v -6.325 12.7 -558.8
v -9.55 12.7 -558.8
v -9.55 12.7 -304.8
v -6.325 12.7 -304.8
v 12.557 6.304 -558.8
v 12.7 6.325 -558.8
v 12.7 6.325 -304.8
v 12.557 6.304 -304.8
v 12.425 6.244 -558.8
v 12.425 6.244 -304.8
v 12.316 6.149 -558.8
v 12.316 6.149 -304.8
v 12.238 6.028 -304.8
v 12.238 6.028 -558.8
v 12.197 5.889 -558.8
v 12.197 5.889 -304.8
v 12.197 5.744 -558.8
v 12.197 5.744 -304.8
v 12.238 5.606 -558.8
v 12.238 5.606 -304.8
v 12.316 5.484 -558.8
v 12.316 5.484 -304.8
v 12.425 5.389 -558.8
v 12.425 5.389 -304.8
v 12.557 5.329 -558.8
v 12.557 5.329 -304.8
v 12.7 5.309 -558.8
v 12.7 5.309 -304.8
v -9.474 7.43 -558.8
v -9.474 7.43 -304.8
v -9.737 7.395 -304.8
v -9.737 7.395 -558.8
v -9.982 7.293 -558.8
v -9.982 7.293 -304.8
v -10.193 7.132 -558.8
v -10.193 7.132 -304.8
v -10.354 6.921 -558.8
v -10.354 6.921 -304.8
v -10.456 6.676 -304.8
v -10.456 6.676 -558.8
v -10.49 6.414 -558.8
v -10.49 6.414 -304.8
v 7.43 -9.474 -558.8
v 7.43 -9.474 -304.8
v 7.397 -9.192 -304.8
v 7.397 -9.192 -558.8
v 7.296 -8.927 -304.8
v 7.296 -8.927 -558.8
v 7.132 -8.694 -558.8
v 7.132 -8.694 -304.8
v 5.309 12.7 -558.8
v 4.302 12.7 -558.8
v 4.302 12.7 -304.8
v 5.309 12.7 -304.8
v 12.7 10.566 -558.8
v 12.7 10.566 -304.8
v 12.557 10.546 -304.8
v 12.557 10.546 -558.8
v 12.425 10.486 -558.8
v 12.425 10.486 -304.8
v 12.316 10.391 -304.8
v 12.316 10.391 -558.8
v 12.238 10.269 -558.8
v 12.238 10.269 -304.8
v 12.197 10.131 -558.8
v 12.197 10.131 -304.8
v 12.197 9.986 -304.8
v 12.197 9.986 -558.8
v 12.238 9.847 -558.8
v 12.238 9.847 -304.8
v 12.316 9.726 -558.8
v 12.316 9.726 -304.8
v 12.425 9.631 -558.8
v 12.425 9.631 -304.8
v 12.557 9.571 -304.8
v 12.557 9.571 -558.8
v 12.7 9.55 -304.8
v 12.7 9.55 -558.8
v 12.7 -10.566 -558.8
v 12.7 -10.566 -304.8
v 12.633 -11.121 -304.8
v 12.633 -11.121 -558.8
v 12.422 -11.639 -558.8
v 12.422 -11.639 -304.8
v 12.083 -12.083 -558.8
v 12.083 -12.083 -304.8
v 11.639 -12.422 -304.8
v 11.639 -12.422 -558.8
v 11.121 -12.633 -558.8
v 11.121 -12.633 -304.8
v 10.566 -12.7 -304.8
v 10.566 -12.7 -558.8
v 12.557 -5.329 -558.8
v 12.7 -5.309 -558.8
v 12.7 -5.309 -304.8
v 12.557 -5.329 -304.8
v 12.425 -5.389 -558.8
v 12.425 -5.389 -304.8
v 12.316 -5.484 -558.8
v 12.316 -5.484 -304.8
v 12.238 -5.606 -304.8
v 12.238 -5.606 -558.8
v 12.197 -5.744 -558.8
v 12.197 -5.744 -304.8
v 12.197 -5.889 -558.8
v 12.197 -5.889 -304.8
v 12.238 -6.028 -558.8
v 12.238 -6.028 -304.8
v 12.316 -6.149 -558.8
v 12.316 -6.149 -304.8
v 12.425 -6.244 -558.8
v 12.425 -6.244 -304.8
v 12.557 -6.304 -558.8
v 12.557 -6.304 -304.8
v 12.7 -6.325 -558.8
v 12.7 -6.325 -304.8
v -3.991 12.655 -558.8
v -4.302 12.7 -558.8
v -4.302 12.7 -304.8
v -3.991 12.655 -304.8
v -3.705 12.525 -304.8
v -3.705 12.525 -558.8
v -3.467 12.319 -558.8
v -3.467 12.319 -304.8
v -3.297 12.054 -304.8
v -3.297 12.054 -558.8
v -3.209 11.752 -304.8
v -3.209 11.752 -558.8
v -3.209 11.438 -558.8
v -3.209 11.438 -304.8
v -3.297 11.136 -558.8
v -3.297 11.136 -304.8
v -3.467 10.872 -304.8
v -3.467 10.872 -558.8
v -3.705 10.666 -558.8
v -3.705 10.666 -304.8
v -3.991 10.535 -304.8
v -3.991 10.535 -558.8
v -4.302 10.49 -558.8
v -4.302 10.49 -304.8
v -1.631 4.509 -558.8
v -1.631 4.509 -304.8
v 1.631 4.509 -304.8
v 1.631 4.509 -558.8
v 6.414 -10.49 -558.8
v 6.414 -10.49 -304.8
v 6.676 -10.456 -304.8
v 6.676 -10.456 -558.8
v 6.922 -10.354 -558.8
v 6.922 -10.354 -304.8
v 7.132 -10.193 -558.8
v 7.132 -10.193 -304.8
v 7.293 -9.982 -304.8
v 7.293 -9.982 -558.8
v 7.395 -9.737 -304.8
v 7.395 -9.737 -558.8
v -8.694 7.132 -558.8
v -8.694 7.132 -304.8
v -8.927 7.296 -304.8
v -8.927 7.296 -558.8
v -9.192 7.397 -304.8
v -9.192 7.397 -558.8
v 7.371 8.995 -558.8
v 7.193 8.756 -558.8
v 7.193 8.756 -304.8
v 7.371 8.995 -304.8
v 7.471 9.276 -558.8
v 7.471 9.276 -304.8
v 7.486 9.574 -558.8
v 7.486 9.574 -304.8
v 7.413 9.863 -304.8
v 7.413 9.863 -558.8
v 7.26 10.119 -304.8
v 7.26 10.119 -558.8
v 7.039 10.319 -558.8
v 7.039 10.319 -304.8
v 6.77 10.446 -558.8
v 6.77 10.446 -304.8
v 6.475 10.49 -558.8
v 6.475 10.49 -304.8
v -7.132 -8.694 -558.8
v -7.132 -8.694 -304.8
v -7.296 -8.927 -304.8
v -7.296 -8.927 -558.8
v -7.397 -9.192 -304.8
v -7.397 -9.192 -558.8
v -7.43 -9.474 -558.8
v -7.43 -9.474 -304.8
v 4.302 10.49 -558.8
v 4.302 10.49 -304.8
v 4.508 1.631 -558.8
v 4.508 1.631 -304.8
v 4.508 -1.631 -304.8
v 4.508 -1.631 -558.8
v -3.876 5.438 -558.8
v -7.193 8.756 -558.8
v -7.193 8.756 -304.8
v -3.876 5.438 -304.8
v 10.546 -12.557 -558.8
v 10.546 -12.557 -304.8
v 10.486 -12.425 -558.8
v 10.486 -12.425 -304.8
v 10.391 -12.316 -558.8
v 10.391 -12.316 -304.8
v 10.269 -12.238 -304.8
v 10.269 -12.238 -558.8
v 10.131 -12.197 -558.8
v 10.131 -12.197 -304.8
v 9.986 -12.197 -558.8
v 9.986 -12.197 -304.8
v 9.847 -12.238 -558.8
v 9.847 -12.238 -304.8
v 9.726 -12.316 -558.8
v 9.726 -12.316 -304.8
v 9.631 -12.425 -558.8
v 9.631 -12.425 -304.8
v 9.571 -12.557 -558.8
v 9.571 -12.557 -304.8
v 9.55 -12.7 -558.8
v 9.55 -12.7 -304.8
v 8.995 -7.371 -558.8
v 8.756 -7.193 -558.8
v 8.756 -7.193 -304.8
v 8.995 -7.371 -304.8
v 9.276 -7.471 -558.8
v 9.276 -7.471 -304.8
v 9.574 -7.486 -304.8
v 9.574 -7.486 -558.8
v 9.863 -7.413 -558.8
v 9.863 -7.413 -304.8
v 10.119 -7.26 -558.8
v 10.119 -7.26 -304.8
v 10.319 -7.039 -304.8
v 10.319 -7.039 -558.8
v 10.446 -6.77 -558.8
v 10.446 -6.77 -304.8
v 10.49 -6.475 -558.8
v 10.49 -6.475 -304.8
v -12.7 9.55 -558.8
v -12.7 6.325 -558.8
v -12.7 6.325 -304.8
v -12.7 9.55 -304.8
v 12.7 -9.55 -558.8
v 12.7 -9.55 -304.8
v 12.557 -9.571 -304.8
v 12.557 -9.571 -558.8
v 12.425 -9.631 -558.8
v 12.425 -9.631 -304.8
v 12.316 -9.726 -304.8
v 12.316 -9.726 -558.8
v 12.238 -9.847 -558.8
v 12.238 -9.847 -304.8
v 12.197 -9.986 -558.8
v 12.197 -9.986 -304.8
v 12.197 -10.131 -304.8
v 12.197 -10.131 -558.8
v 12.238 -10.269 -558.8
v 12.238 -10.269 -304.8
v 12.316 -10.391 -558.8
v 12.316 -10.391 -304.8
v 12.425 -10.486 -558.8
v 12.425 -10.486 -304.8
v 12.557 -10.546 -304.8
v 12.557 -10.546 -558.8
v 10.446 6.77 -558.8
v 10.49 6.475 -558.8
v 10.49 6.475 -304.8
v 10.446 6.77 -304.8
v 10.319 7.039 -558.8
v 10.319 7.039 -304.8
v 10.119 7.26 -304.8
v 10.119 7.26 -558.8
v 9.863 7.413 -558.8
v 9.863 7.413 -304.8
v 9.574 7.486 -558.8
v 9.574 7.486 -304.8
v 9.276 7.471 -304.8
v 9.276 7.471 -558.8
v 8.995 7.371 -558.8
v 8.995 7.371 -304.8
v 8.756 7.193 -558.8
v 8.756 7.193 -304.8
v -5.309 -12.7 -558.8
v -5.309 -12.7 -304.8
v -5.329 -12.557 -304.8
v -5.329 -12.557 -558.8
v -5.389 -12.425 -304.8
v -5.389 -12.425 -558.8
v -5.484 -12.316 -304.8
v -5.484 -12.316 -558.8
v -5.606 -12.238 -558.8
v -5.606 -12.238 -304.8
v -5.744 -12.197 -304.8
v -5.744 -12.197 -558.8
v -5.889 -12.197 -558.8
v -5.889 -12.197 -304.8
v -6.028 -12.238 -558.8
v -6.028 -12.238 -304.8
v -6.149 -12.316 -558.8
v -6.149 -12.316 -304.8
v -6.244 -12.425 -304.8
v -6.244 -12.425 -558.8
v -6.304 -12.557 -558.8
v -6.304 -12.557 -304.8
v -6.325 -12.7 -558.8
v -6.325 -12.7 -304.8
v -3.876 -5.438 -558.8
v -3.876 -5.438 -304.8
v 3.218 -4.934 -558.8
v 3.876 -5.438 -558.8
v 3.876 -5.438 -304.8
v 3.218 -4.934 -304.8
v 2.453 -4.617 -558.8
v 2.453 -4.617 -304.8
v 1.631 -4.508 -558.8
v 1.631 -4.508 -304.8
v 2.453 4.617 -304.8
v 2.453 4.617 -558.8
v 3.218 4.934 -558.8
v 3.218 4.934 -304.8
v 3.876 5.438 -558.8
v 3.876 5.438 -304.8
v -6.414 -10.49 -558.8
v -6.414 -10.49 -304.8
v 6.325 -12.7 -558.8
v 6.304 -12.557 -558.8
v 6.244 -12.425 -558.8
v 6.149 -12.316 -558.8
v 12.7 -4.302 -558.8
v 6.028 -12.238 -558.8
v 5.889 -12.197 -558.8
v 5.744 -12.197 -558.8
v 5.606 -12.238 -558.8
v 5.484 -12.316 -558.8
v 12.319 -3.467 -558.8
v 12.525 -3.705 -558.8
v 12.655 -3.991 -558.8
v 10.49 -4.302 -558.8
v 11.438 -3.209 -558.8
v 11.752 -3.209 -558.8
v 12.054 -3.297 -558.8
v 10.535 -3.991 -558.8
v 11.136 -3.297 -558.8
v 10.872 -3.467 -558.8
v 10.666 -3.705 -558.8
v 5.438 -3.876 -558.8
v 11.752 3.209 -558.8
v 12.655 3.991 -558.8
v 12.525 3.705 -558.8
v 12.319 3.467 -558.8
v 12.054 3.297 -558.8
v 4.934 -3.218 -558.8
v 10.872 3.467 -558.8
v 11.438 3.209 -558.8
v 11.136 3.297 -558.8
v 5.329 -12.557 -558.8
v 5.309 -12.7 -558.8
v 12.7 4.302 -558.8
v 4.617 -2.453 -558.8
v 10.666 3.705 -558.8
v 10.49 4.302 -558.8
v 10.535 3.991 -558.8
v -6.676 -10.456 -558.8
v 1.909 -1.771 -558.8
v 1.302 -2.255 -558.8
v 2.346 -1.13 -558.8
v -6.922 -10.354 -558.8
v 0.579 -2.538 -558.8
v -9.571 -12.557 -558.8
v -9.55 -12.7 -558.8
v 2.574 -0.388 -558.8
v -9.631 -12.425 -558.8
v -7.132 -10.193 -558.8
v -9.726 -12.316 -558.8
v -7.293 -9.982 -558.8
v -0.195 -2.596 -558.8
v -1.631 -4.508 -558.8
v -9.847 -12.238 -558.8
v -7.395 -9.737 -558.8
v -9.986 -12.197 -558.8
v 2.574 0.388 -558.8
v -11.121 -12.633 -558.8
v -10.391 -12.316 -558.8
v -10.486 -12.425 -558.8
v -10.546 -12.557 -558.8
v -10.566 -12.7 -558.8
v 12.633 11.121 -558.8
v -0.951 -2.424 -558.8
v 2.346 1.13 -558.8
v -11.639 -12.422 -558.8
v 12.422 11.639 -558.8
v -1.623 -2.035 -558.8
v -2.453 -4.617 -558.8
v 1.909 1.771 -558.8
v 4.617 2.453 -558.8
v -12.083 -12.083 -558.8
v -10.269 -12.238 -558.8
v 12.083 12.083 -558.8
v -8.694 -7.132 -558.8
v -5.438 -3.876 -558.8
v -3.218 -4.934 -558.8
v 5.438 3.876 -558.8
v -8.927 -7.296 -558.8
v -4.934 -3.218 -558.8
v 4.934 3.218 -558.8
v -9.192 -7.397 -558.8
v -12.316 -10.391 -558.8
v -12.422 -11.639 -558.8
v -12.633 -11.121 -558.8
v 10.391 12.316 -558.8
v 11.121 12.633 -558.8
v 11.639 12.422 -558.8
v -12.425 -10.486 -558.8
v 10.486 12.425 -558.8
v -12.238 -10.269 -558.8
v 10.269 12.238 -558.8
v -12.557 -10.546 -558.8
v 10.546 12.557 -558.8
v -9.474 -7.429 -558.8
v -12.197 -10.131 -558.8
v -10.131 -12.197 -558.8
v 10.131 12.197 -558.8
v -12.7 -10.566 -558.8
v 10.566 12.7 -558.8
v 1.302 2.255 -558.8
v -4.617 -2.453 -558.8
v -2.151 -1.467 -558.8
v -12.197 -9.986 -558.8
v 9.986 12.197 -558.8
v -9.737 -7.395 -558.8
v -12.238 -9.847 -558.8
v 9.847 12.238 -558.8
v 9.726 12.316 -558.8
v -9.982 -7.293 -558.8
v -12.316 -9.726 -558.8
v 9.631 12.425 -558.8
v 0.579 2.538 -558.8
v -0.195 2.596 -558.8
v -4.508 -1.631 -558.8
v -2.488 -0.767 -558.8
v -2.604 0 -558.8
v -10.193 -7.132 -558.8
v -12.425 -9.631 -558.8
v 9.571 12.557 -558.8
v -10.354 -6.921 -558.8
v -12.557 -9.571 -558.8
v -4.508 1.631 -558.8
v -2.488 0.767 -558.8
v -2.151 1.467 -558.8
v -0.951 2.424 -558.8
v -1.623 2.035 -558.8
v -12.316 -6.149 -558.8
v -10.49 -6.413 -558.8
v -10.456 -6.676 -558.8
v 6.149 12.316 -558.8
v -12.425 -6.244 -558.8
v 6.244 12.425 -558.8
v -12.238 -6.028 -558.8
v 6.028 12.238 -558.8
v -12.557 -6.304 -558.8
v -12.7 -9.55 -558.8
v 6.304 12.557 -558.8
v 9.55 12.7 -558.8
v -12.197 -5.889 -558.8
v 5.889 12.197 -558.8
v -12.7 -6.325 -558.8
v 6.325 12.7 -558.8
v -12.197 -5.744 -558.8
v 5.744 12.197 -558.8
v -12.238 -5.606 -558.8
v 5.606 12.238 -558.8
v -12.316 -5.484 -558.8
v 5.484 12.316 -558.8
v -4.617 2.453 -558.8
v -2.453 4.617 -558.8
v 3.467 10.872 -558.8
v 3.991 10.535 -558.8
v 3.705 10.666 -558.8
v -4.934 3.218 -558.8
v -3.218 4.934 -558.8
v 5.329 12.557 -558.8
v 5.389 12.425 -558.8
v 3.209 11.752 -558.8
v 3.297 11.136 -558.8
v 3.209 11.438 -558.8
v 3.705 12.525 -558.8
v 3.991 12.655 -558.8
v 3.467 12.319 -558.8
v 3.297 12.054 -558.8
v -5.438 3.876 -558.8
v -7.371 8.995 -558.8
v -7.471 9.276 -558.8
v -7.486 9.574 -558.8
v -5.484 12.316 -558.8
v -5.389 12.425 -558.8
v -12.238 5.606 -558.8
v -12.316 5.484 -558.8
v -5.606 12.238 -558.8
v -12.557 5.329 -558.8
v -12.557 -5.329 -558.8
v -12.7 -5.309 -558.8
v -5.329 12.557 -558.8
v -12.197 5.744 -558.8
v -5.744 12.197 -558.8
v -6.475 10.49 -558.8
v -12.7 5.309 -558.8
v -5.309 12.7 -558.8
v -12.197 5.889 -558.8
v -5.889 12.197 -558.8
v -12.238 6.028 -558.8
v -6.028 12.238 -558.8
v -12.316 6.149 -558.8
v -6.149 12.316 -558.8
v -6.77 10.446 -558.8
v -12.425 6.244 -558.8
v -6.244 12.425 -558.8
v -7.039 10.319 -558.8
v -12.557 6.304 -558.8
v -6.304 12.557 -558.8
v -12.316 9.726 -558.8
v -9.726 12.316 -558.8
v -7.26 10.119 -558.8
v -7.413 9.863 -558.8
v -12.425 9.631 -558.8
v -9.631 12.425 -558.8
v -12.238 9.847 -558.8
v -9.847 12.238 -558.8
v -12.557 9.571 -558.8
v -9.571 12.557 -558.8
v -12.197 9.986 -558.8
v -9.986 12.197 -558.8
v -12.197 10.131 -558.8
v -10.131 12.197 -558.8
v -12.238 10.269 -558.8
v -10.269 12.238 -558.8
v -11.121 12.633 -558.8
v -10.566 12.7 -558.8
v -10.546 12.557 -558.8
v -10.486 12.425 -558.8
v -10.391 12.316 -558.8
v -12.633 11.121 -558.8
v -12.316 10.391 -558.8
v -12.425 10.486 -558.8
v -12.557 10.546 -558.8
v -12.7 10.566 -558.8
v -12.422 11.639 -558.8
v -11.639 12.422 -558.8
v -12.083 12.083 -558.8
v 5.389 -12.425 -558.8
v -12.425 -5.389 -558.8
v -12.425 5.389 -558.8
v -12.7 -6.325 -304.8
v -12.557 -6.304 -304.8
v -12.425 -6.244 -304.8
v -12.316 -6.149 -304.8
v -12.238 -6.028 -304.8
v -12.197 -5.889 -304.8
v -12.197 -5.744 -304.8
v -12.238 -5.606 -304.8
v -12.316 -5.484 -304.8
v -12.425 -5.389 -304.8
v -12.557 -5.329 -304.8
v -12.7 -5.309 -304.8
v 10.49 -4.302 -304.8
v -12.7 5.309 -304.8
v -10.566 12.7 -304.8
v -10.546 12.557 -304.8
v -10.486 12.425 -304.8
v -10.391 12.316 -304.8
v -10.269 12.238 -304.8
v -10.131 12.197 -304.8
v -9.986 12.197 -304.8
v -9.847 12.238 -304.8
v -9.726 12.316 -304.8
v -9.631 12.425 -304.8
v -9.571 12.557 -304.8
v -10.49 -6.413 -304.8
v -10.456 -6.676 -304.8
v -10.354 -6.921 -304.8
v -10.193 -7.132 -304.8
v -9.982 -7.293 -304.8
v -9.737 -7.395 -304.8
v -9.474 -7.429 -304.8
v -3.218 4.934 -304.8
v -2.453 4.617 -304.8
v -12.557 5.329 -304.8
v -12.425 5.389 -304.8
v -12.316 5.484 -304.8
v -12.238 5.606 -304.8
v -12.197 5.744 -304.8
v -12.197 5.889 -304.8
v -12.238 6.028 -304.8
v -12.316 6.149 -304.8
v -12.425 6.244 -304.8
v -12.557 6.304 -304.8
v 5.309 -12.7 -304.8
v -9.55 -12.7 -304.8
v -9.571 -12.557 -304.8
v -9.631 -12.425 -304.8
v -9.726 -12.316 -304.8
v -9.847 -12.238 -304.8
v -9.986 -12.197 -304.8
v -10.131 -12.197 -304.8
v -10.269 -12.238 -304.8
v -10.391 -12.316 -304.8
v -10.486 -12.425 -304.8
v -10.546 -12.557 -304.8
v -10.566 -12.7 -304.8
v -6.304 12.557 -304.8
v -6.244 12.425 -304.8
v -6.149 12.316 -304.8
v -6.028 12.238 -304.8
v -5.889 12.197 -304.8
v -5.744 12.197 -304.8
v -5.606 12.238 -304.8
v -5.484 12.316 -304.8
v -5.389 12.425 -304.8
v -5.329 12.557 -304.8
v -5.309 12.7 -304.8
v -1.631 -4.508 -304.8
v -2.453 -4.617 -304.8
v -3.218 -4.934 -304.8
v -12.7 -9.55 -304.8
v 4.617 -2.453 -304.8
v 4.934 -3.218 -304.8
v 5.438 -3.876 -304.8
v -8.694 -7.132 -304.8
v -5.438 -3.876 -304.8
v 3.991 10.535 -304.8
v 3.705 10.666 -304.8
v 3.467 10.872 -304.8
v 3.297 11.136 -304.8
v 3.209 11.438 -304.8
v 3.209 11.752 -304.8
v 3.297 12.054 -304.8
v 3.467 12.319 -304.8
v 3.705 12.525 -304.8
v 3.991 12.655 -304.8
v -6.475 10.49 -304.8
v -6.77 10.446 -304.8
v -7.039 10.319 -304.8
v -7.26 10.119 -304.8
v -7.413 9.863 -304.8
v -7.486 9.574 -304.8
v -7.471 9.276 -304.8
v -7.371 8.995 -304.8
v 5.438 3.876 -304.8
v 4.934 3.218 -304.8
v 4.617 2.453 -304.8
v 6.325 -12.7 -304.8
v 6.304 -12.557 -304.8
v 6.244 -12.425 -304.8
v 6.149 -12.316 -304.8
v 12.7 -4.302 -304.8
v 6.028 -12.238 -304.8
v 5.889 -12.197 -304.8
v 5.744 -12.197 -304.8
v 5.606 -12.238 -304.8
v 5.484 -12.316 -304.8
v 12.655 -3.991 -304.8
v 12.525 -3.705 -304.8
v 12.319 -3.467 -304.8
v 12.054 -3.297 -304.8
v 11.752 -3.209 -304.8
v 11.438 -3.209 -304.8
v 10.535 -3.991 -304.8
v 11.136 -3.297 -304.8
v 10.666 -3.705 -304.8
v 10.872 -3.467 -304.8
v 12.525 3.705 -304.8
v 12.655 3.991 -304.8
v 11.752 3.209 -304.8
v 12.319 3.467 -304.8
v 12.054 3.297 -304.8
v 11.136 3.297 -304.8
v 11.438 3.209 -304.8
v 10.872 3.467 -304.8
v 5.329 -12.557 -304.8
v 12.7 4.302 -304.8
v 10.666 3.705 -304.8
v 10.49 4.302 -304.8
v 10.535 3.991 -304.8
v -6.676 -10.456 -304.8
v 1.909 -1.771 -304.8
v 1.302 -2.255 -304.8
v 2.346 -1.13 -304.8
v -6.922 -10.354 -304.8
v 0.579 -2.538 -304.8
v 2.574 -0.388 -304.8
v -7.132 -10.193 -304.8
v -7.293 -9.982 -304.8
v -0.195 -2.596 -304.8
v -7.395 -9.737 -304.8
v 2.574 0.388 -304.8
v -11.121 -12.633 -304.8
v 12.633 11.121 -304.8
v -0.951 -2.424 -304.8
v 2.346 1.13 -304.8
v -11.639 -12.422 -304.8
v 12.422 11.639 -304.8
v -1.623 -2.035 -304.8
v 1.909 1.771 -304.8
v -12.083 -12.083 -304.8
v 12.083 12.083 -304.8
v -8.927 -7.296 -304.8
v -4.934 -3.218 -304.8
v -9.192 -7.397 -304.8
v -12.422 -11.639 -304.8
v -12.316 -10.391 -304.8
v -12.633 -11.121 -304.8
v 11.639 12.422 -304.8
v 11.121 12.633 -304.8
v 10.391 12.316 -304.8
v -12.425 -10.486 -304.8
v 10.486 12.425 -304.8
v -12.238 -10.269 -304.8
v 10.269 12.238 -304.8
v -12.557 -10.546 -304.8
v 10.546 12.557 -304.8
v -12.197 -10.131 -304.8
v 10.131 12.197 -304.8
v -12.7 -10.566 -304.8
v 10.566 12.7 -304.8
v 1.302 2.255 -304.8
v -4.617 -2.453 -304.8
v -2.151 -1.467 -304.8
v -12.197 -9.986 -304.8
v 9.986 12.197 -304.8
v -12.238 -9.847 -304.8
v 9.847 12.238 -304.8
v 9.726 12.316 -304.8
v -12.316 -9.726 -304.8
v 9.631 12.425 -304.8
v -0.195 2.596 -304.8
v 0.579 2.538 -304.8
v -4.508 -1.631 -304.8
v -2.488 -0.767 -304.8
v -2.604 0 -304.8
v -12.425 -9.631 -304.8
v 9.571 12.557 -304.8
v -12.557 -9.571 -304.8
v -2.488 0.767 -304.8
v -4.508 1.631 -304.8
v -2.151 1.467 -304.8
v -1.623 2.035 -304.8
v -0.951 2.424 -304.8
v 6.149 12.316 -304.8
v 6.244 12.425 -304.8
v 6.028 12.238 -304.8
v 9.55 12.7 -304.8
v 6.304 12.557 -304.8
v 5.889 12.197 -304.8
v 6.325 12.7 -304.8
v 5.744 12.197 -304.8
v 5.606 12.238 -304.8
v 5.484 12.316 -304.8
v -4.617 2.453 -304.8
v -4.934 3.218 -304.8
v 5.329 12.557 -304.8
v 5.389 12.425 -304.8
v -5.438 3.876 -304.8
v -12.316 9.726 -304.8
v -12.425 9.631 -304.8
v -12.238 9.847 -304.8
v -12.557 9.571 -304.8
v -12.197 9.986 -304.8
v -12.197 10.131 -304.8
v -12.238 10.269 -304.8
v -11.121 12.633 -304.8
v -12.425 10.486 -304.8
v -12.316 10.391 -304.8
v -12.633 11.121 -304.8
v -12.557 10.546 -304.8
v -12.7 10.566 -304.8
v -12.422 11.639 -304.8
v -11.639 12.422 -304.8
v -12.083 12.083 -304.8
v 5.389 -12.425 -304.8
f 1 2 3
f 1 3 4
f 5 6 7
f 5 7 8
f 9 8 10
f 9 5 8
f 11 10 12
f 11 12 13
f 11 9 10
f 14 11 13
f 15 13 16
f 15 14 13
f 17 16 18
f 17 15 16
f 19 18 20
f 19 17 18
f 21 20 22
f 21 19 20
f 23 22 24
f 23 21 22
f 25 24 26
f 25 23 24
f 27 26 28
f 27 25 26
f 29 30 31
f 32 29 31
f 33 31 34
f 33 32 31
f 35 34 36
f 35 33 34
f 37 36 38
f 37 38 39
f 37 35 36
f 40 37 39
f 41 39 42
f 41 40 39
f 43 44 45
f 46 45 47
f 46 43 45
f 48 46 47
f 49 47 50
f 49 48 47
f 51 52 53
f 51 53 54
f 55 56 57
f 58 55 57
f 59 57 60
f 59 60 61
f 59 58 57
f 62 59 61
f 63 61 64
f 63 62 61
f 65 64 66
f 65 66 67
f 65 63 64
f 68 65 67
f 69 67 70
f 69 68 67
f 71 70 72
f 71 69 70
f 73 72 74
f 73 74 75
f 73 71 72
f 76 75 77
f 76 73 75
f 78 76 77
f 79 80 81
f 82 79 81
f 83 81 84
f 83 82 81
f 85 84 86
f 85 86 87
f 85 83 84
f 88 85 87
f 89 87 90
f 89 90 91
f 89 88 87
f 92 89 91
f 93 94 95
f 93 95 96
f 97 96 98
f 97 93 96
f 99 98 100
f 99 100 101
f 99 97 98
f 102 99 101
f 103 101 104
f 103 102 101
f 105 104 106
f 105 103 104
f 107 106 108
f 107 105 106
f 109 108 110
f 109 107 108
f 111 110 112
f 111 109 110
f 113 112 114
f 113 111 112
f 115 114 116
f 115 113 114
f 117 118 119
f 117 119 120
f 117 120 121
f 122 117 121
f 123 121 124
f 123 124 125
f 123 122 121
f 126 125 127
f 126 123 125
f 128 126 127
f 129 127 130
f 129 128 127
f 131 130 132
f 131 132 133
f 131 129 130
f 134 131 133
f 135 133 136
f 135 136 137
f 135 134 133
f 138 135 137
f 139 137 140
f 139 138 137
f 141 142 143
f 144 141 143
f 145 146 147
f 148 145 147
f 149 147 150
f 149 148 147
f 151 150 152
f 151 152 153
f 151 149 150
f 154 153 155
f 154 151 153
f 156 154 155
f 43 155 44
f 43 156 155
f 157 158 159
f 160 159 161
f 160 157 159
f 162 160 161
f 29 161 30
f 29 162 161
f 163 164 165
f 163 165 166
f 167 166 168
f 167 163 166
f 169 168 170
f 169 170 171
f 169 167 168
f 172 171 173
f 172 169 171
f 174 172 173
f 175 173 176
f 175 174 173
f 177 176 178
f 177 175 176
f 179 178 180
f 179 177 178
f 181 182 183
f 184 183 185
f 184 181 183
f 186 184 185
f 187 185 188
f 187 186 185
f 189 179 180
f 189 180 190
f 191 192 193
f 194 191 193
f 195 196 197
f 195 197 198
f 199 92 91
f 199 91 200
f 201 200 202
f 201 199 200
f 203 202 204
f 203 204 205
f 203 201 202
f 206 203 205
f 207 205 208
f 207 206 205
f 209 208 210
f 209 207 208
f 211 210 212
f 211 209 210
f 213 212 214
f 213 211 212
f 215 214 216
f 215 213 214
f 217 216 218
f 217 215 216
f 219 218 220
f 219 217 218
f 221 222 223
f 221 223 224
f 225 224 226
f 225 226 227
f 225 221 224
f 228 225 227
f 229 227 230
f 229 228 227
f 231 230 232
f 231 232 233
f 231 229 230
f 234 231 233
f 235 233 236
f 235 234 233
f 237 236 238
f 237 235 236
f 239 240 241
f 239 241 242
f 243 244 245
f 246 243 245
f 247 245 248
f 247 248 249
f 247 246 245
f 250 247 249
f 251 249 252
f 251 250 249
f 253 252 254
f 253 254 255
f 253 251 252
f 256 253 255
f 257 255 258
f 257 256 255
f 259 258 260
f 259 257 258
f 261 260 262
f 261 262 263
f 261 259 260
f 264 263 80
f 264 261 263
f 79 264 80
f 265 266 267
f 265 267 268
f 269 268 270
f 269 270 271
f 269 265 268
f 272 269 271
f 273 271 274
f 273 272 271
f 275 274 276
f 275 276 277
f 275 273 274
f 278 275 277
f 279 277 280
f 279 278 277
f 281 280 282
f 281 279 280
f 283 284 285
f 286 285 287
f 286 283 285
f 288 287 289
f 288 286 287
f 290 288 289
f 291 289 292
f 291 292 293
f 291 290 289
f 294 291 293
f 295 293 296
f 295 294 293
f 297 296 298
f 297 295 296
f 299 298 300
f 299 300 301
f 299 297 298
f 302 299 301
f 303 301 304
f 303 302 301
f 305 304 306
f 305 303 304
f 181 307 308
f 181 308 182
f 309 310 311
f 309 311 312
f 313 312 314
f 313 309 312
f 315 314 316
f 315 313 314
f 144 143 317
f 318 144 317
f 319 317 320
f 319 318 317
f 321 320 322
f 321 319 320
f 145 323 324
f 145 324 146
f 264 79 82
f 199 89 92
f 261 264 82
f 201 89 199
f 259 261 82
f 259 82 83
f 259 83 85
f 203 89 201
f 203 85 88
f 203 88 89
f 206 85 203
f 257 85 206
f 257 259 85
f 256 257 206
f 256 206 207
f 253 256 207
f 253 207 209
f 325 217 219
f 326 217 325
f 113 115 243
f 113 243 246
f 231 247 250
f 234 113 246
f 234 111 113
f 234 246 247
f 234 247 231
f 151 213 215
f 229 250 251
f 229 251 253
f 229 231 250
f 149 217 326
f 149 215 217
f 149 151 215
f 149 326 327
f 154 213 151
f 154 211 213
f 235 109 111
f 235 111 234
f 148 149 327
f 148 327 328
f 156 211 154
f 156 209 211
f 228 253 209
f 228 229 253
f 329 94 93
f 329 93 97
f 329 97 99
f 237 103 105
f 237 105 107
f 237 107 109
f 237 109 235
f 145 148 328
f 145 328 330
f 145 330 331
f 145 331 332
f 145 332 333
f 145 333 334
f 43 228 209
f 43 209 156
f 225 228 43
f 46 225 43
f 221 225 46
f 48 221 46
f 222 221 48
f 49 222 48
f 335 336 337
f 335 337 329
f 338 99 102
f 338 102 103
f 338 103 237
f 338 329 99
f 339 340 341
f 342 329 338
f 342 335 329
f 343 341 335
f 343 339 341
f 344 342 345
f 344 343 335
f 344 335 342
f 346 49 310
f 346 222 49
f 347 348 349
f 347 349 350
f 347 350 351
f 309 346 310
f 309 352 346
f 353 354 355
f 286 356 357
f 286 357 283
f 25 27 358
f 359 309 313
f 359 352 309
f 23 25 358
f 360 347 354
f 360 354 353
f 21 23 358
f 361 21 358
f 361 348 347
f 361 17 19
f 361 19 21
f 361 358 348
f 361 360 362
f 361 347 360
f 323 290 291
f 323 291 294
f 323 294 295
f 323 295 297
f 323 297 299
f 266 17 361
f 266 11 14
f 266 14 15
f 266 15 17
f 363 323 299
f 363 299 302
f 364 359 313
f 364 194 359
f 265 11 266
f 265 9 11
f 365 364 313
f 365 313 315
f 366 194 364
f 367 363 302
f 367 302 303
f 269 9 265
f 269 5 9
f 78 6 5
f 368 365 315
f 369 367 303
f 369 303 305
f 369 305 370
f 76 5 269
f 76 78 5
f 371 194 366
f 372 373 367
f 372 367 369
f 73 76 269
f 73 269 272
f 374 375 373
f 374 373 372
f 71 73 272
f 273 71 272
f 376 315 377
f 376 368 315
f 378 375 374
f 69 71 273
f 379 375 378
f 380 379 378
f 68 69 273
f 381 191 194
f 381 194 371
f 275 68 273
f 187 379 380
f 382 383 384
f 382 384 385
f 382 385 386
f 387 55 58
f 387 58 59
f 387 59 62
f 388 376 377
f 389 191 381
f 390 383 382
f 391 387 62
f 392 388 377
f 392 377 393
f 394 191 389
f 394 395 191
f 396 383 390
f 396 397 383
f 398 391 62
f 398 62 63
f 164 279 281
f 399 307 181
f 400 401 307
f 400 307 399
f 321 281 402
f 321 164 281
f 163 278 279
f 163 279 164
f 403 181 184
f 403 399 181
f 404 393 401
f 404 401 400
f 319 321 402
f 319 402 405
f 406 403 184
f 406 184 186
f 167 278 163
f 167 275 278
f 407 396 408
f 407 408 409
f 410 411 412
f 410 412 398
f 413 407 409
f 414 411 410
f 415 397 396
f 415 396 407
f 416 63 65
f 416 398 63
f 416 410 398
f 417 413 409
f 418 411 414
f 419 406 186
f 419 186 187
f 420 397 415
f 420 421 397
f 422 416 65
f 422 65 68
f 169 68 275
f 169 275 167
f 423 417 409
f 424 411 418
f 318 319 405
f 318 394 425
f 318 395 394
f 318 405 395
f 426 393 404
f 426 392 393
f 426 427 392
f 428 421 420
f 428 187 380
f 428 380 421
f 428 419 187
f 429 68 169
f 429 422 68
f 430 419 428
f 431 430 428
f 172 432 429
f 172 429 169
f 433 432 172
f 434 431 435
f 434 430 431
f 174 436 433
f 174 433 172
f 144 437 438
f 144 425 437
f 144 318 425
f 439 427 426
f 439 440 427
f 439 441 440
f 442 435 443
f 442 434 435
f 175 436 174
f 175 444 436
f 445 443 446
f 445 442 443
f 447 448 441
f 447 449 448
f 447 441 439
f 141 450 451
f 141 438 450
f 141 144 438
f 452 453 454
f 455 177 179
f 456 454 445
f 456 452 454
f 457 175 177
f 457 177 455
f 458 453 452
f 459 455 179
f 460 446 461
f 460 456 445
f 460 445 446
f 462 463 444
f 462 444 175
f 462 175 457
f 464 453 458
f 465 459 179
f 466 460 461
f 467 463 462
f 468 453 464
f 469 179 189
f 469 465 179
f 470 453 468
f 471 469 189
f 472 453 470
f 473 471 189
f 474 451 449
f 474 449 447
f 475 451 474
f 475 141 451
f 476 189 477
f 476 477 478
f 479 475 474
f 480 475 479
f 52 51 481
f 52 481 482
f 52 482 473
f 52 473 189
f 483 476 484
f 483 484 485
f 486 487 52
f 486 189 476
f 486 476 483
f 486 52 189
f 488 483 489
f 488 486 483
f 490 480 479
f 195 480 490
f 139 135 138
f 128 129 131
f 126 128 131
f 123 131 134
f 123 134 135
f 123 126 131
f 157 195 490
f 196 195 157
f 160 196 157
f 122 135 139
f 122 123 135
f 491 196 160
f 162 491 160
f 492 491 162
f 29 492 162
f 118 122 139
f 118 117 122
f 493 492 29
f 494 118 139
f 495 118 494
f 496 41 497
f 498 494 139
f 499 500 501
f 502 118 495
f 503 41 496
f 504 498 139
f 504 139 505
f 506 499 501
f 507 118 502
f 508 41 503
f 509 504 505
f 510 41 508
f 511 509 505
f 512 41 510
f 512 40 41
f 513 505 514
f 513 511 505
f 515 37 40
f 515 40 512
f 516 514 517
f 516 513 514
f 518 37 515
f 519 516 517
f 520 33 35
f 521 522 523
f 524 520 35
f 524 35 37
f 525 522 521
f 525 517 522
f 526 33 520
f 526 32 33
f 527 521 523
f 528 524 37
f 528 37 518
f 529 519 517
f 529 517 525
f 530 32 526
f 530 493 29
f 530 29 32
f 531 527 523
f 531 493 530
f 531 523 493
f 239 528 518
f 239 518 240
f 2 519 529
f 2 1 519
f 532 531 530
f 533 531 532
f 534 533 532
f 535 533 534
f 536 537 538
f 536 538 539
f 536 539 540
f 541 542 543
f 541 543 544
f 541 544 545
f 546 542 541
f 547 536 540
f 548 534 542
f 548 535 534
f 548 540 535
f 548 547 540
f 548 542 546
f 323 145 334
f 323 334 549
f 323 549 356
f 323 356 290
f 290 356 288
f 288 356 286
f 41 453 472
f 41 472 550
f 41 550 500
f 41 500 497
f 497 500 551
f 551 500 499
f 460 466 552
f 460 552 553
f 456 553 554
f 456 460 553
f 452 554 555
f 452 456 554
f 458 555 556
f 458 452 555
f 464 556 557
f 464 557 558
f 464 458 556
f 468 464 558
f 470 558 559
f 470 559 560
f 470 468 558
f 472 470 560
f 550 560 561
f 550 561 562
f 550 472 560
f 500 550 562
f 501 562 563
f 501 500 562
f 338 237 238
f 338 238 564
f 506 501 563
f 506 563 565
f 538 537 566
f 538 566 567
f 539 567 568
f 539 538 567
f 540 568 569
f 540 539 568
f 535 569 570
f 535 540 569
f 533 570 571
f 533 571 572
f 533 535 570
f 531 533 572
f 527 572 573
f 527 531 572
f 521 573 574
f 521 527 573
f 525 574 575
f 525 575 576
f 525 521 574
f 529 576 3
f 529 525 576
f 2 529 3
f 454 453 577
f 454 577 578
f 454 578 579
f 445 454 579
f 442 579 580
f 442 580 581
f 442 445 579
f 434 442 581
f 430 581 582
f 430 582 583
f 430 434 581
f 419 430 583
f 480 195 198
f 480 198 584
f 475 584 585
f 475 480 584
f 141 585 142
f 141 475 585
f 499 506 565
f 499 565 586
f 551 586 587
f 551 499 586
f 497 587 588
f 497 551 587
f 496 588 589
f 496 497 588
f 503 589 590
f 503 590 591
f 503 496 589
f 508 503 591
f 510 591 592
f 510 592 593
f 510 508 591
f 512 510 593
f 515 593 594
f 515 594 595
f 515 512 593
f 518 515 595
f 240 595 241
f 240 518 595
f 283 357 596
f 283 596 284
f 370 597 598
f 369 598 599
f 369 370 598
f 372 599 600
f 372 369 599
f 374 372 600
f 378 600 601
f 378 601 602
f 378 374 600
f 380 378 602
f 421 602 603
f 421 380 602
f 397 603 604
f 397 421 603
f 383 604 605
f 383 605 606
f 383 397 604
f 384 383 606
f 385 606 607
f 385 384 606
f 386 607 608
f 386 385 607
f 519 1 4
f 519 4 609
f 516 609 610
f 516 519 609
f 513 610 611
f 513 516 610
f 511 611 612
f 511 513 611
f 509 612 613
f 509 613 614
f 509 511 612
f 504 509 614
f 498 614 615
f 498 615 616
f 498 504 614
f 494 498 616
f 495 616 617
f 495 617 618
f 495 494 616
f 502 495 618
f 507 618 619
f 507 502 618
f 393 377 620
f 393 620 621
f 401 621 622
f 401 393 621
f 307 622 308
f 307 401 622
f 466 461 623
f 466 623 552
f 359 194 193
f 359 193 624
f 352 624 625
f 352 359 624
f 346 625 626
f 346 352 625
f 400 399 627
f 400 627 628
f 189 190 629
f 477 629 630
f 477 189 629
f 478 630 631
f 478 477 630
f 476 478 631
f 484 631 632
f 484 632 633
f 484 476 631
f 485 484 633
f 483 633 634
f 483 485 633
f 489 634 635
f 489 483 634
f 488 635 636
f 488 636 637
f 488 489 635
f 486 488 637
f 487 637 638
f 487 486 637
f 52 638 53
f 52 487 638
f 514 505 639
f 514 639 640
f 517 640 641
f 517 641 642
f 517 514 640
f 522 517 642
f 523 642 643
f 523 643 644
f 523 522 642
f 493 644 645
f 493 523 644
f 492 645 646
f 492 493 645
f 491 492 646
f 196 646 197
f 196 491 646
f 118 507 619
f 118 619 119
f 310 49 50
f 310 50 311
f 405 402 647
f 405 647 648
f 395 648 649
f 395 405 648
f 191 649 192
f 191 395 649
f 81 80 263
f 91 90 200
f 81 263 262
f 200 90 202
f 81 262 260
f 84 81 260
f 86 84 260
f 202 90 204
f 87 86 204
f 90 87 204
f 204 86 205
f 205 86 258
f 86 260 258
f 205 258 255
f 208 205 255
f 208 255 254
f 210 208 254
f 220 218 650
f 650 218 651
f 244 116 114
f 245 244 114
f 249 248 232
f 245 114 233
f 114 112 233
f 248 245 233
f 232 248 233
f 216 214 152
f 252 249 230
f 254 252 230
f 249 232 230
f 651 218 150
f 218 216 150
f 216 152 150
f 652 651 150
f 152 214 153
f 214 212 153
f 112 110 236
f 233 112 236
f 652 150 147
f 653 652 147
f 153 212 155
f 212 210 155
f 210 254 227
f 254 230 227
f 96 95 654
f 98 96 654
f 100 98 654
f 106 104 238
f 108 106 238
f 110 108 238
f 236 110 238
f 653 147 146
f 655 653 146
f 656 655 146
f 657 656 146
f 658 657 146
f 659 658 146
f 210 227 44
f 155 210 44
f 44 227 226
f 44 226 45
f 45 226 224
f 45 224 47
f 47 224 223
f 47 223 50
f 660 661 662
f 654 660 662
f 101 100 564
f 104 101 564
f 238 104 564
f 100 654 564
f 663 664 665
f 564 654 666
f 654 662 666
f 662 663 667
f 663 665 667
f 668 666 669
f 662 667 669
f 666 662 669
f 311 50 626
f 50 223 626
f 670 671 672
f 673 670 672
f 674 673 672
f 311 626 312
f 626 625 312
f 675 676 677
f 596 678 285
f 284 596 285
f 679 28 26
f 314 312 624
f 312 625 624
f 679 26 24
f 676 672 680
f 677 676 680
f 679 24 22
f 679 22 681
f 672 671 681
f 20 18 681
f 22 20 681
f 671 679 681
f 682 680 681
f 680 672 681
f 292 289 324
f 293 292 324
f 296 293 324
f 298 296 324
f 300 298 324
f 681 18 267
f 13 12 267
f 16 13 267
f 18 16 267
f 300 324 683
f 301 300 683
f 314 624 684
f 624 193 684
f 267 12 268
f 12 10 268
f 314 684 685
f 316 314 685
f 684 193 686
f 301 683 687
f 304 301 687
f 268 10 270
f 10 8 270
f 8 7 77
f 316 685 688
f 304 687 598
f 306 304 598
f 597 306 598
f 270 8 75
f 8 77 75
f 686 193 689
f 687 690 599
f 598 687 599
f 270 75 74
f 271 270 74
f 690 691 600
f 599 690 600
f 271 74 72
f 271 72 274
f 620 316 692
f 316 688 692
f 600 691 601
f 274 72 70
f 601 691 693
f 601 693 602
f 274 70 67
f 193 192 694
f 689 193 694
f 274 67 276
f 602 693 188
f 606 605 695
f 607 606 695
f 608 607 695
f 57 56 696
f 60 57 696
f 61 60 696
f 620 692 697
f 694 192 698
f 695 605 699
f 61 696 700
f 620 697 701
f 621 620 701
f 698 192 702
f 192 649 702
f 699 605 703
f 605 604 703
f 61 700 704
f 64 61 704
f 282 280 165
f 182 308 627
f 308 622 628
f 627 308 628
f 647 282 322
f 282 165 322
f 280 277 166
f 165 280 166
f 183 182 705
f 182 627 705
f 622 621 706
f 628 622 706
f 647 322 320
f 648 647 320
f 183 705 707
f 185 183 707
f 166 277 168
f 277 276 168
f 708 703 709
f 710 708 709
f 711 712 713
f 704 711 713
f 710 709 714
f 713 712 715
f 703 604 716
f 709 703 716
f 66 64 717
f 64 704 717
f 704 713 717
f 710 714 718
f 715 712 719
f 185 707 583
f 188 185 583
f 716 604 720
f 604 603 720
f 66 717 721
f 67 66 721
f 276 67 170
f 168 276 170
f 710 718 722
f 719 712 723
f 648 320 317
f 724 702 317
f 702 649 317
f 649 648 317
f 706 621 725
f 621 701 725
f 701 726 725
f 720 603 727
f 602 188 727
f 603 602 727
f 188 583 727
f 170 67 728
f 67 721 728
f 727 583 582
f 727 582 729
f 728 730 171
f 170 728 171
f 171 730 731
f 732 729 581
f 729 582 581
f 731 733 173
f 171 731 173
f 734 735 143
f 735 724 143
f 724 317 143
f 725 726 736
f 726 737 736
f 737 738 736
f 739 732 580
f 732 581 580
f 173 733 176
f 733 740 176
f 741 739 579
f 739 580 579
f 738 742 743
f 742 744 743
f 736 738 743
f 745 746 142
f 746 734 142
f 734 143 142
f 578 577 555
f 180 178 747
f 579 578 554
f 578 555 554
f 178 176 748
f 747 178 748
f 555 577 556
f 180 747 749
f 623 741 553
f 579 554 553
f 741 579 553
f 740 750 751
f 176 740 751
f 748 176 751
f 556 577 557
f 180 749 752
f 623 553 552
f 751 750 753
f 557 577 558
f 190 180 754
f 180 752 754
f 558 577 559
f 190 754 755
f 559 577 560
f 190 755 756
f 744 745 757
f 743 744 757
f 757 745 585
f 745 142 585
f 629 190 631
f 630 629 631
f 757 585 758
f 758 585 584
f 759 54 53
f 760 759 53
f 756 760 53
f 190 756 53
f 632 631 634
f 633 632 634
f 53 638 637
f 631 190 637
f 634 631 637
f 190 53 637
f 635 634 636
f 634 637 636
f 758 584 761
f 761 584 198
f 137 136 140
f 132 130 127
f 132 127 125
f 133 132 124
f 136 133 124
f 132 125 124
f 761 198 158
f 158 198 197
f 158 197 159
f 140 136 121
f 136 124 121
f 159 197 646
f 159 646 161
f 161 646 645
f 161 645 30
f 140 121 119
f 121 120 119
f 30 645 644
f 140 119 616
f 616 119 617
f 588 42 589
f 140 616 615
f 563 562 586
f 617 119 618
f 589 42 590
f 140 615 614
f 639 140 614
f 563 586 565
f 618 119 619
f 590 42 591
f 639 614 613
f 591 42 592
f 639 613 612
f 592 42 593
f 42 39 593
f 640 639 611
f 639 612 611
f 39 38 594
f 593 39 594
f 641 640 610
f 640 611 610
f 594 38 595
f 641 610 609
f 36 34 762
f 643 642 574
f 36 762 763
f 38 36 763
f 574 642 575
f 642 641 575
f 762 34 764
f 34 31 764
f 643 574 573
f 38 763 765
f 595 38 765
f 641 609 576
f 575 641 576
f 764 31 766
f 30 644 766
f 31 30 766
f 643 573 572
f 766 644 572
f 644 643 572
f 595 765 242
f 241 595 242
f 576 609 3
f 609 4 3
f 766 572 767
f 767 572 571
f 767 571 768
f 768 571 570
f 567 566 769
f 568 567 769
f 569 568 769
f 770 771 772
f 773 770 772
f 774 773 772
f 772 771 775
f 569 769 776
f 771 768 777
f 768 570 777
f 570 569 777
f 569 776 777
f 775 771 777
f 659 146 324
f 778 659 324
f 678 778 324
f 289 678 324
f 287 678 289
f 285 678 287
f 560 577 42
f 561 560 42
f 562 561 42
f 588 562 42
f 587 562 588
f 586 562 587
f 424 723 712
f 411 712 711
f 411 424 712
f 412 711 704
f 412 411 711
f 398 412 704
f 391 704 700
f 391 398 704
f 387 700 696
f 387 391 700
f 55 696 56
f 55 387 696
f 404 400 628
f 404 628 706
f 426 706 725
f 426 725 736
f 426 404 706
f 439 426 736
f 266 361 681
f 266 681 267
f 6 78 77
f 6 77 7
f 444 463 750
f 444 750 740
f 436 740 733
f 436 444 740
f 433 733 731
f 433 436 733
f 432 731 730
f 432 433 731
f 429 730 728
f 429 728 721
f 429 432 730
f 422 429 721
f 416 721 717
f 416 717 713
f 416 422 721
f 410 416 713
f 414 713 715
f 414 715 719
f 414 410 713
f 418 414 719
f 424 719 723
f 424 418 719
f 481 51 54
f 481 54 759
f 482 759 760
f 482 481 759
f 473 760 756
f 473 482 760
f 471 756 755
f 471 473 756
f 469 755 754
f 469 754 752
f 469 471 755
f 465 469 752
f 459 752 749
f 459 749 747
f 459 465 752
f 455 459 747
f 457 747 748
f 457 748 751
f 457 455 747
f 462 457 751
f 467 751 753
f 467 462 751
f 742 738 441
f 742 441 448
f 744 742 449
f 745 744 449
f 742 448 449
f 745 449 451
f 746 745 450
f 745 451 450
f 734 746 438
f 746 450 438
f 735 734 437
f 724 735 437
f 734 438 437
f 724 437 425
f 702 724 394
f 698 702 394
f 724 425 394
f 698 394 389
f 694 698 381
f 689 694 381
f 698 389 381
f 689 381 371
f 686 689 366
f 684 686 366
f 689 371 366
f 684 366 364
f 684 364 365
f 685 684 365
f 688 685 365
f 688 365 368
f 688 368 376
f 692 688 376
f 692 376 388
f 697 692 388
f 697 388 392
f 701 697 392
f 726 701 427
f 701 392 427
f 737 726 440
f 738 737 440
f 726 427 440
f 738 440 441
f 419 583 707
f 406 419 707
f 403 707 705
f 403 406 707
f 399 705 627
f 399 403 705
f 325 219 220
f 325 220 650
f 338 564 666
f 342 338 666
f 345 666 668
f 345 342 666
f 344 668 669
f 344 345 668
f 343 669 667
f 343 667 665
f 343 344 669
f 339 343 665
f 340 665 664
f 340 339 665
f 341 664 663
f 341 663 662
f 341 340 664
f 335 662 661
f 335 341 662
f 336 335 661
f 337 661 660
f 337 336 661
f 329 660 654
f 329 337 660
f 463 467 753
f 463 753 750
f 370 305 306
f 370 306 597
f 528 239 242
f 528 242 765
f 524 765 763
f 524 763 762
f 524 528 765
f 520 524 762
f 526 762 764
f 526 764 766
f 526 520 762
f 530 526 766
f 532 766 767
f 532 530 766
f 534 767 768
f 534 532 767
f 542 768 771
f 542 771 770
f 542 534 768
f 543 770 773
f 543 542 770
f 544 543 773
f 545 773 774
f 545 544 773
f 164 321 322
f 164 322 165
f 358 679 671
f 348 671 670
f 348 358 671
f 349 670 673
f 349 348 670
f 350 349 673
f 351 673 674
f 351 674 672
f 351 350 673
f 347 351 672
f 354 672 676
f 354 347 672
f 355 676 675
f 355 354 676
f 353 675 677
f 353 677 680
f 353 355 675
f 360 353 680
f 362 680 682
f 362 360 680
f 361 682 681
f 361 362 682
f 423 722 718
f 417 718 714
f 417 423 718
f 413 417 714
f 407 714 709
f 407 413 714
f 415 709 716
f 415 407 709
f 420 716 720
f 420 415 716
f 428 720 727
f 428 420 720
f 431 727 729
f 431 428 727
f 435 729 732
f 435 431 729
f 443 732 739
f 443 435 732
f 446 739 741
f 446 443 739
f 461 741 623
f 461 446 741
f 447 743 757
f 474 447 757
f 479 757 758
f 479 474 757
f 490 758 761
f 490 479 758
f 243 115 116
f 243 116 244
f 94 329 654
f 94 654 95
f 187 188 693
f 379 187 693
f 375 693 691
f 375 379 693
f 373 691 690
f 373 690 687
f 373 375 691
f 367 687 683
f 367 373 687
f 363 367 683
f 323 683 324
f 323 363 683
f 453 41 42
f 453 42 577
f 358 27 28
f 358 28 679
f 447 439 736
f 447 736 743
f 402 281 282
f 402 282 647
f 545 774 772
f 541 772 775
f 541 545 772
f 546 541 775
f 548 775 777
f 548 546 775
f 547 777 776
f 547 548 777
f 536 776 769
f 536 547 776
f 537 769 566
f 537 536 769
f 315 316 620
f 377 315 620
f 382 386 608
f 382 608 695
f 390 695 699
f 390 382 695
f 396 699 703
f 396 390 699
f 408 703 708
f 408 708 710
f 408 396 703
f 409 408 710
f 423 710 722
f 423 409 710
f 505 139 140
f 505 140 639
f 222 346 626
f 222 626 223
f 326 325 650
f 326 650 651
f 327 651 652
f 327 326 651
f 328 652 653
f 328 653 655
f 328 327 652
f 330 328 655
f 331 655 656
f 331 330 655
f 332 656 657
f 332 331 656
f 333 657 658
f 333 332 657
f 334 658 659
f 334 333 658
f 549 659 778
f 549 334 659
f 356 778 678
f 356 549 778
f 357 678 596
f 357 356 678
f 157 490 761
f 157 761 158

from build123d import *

# Parameters (mm, degrees)
SKETCH1_R           = 2.6035
BOSS_EXTRUDE1_DEPTH = 254


with BuildPart() as part:
    # Sketch1 → Boss-Extrude1 (new body)
    with BuildSketch(Plane(origin=(0, 0, -558.8), x_dir=(-1, 0, 0), z_dir=(0, 0, -1))):
        with BuildLine():
            Line((12.699999967, -9.5504), (12.699999967, -6.3246))
            ThreePointArc((12.699999967, -6.3246), (12.191999967, -5.8166), (12.699999967, -5.3086))
            Line((12.699999967, -5.3086), (12.699999967, 5.3086))
            ThreePointArc((12.699999967, 5.3086), (12.191999967, 5.8166), (12.699999967, 6.3246))
            Line((12.699999967, 6.3246), (12.699999967, 9.550399967))
            ThreePointArc((12.699999967, 9.550399967), (12.191999934, 10.058400016), (12.699999999, 10.566400033))
            ThreePointArc((12.699999999, 10.566400033), (12.082677404, 12.082677438), (10.566399999, 12.700000033))
            ThreePointArc((10.566399999, 12.700000033), (10.058400007, 12.192000016), (9.550399999, 12.700000016))
            Line((9.550399999, 12.700000016), (6.324599999, 12.700000016))
            ThreePointArc((6.324599999, 12.700000016), (5.816599999, 12.192000016), (5.308599999, 12.700000016))
            Line((5.308599999, 12.700000016), (4.302307888, 12.700000016))
            ThreePointArc((4.302307888, 12.700000016), (3.197407888, 11.595100016), (4.302307888, 10.490200016))
            Line((4.302307888, 10.490200016), (6.474794464, 10.490200016))
            ThreePointArc((6.474794464, 10.490200016), (7.413456072, 9.863006381), (7.193214956, 8.755779521))
            Line((7.193214956, 8.755779521), (3.875871421, 5.438435986))
            ThreePointArc((3.875871421, 5.438435986), (2.845827288, 4.7501825), (1.63080739, 4.508500016))
            Line((1.63080739, 4.508500016), (-1.630807376, 4.508500016))
            ThreePointArc((-1.630807376, 4.508500016), (-2.845827273, 4.7501825), (-3.875871406, 5.438435986))
            Line((-3.875871406, 5.438435986), (-7.193214947, 8.755779526))
            ThreePointArc((-7.193214947, 8.755779526), (-7.413456062, 9.863006383), (-6.474794457, 10.490200016))
            Line((-6.474794457, 10.490200016), (-4.302307919, 10.490200016))
            ThreePointArc((-4.302307919, 10.490200016), (-3.197407919, 11.595100016), (-4.302307919, 12.700000016))
            Line((-4.302307919, 12.700000016), (-5.308600001, 12.700000016))
            ThreePointArc((-5.308600001, 12.700000016), (-5.816600001, 12.192000016), (-6.324600001, 12.700000016))
            Line((-6.324600001, 12.700000016), (-9.550400001, 12.700000016))
            ThreePointArc((-9.550400001, 12.700000016), (-10.058400001, 12.192000016), (-10.566400001, 12.700000016))
            ThreePointArc((-10.566400001, 12.700000016), (-12.082677418, 12.082677417), (-12.700000017, 10.5664))
            ThreePointArc((-12.700000017, 10.5664), (-12.192, 10.058400008), (-12.7, 9.5504))
            Line((-12.7, 9.5504), (-12.7, 6.3246))
            ThreePointArc((-12.7, 6.3246), (-12.192, 5.8166), (-12.7, 5.3086))
            Line((-12.7, 5.3086), (-12.7, 4.302307889))
            ThreePointArc((-12.7, 4.302307889), (-11.5951, 3.197407889), (-10.4902, 4.302307889))
            Line((-10.4902, 4.302307889), (-10.4902, 6.474794456))
            ThreePointArc((-10.4902, 6.474794456), (-9.863006367, 7.413456061), (-8.75577951, 7.193214945))
            Line((-8.75577951, 7.193214945), (-5.43843597, 3.875871405))
            ThreePointArc((-5.43843597, 3.875871405), (-4.750182484, 2.845827272), (-4.5085, 1.630807374))
            Line((-4.5085, 1.630807374), (-4.5085, -1.630807374))
            ThreePointArc((-4.5085, -1.630807374), (-4.750182484, -2.845827272), (-5.43843597, -3.875871405))
            Line((-5.43843597, -3.875871405), (-8.75577951, -7.193214945))
            ThreePointArc((-8.75577951, -7.193214945), (-9.863006367, -7.413456061), (-10.4902, -6.474794456))
            Line((-10.4902, -6.474794456), (-10.4902, -4.302307918))
            ThreePointArc((-10.4902, -4.302307918), (-11.5951, -3.197407918), (-12.7, -4.302307918))
            Line((-12.7, -4.302307918), (-12.7, -5.3086))
            ThreePointArc((-12.7, -5.3086), (-12.192, -5.8166), (-12.7, -6.3246))
            Line((-12.7, -6.3246), (-12.7, -9.5504))
            ThreePointArc((-12.7, -9.5504), (-12.192, -10.058400008), (-12.700000017, -10.5664))
            ThreePointArc((-12.700000017, -10.5664), (-12.082677422, -12.082677406), (-10.566400017, -12.7))
            ThreePointArc((-10.566400017, -12.7), (-10.058400017, -12.192), (-9.550400017, -12.7))
            Line((-9.550400017, -12.7), (-6.324600017, -12.7))
            ThreePointArc((-6.324600017, -12.7), (-5.816600017, -12.192), (-5.308600017, -12.7))
            Line((-5.308600017, -12.7), (5.308599983, -12.7))
            ThreePointArc((5.308599983, -12.7), (5.816599983, -12.192), (6.324599983, -12.7))
            Line((6.324599983, -12.7), (9.550399983, -12.7))
            ThreePointArc((9.550399983, -12.7), (10.058399983, -12.192), (10.566399983, -12.7))
            ThreePointArc((10.566399983, -12.7), (12.082677389, -12.082677406), (12.699999983, -10.5664))
            ThreePointArc((12.699999983, -10.5664), (12.191999967, -10.058400008), (12.699999967, -9.5504))
        make_face()
        Circle(SKETCH1_R, mode=Mode.SUBTRACT)
        with BuildLine():
            Line((3.875871405, -5.43843597), (7.13192049, -8.694485055))
            ThreePointArc((7.13192049, -8.694485055), (7.35441848, -9.056211656), (7.4295, -9.4742))
            ThreePointArc((7.4295, -9.4742), (7.13192049, -10.19262049), (6.4135, -10.4902))
            Line((6.4135, -10.4902), (-6.4135, -10.4902))
            ThreePointArc((-6.4135, -10.4902), (-7.13192049, -10.19262049), (-7.4295, -9.4742))
            ThreePointArc((-7.4295, -9.4742), (-7.35441848, -9.056211656), (-7.13192049, -8.694485055))
            Line((-7.13192049, -8.694485055), (-3.875871405, -5.43843597))
            ThreePointArc((-3.875871405, -5.43843597), (-2.845827272, -4.750182484), (-1.630807374, -4.5085))
            Line((-1.630807374, -4.5085), (1.630807374, -4.5085))
            ThreePointArc((1.630807374, -4.5085), (2.845827272, -4.750182484), (3.875871405, -5.43843597))
        make_face(mode=Mode.SUBTRACT)
        with BuildLine():
            Line((10.490199999, 6.4135), (10.490199999, -6.413499984))
            ThreePointArc((10.490199999, -6.413499984), (10.192620488, -7.131920474), (9.474199999, -7.429499984))
            ThreePointArc((9.474199999, -7.429499984), (9.056211655, -7.354418464), (8.694485053, -7.131920474))
            Line((8.694485053, -7.131920474), (5.438435968, -3.875871389))
            ThreePointArc((5.438435968, -3.875871389), (4.750182483, -2.845827256), (4.508499999, -1.630807359))
            Line((4.508499999, -1.630807359), (4.508499999, 1.630807373))
            ThreePointArc((4.508499999, 1.630807373), (4.750182483, 2.845827271), (5.438435968, 3.875871403))
            Line((5.438435968, 3.875871403), (8.694485055, 7.13192049))
            ThreePointArc((8.694485055, 7.13192049), (9.056211656, 7.35441848), (9.4742, 7.4295))
            ThreePointArc((9.4742, 7.4295), (10.192620489, 7.131920489), (10.490199999, 6.4135))
        make_face(mode=Mode.SUBTRACT)
    extrude(amount=-BOSS_EXTRUDE1_DEPTH)


solid = part.part
